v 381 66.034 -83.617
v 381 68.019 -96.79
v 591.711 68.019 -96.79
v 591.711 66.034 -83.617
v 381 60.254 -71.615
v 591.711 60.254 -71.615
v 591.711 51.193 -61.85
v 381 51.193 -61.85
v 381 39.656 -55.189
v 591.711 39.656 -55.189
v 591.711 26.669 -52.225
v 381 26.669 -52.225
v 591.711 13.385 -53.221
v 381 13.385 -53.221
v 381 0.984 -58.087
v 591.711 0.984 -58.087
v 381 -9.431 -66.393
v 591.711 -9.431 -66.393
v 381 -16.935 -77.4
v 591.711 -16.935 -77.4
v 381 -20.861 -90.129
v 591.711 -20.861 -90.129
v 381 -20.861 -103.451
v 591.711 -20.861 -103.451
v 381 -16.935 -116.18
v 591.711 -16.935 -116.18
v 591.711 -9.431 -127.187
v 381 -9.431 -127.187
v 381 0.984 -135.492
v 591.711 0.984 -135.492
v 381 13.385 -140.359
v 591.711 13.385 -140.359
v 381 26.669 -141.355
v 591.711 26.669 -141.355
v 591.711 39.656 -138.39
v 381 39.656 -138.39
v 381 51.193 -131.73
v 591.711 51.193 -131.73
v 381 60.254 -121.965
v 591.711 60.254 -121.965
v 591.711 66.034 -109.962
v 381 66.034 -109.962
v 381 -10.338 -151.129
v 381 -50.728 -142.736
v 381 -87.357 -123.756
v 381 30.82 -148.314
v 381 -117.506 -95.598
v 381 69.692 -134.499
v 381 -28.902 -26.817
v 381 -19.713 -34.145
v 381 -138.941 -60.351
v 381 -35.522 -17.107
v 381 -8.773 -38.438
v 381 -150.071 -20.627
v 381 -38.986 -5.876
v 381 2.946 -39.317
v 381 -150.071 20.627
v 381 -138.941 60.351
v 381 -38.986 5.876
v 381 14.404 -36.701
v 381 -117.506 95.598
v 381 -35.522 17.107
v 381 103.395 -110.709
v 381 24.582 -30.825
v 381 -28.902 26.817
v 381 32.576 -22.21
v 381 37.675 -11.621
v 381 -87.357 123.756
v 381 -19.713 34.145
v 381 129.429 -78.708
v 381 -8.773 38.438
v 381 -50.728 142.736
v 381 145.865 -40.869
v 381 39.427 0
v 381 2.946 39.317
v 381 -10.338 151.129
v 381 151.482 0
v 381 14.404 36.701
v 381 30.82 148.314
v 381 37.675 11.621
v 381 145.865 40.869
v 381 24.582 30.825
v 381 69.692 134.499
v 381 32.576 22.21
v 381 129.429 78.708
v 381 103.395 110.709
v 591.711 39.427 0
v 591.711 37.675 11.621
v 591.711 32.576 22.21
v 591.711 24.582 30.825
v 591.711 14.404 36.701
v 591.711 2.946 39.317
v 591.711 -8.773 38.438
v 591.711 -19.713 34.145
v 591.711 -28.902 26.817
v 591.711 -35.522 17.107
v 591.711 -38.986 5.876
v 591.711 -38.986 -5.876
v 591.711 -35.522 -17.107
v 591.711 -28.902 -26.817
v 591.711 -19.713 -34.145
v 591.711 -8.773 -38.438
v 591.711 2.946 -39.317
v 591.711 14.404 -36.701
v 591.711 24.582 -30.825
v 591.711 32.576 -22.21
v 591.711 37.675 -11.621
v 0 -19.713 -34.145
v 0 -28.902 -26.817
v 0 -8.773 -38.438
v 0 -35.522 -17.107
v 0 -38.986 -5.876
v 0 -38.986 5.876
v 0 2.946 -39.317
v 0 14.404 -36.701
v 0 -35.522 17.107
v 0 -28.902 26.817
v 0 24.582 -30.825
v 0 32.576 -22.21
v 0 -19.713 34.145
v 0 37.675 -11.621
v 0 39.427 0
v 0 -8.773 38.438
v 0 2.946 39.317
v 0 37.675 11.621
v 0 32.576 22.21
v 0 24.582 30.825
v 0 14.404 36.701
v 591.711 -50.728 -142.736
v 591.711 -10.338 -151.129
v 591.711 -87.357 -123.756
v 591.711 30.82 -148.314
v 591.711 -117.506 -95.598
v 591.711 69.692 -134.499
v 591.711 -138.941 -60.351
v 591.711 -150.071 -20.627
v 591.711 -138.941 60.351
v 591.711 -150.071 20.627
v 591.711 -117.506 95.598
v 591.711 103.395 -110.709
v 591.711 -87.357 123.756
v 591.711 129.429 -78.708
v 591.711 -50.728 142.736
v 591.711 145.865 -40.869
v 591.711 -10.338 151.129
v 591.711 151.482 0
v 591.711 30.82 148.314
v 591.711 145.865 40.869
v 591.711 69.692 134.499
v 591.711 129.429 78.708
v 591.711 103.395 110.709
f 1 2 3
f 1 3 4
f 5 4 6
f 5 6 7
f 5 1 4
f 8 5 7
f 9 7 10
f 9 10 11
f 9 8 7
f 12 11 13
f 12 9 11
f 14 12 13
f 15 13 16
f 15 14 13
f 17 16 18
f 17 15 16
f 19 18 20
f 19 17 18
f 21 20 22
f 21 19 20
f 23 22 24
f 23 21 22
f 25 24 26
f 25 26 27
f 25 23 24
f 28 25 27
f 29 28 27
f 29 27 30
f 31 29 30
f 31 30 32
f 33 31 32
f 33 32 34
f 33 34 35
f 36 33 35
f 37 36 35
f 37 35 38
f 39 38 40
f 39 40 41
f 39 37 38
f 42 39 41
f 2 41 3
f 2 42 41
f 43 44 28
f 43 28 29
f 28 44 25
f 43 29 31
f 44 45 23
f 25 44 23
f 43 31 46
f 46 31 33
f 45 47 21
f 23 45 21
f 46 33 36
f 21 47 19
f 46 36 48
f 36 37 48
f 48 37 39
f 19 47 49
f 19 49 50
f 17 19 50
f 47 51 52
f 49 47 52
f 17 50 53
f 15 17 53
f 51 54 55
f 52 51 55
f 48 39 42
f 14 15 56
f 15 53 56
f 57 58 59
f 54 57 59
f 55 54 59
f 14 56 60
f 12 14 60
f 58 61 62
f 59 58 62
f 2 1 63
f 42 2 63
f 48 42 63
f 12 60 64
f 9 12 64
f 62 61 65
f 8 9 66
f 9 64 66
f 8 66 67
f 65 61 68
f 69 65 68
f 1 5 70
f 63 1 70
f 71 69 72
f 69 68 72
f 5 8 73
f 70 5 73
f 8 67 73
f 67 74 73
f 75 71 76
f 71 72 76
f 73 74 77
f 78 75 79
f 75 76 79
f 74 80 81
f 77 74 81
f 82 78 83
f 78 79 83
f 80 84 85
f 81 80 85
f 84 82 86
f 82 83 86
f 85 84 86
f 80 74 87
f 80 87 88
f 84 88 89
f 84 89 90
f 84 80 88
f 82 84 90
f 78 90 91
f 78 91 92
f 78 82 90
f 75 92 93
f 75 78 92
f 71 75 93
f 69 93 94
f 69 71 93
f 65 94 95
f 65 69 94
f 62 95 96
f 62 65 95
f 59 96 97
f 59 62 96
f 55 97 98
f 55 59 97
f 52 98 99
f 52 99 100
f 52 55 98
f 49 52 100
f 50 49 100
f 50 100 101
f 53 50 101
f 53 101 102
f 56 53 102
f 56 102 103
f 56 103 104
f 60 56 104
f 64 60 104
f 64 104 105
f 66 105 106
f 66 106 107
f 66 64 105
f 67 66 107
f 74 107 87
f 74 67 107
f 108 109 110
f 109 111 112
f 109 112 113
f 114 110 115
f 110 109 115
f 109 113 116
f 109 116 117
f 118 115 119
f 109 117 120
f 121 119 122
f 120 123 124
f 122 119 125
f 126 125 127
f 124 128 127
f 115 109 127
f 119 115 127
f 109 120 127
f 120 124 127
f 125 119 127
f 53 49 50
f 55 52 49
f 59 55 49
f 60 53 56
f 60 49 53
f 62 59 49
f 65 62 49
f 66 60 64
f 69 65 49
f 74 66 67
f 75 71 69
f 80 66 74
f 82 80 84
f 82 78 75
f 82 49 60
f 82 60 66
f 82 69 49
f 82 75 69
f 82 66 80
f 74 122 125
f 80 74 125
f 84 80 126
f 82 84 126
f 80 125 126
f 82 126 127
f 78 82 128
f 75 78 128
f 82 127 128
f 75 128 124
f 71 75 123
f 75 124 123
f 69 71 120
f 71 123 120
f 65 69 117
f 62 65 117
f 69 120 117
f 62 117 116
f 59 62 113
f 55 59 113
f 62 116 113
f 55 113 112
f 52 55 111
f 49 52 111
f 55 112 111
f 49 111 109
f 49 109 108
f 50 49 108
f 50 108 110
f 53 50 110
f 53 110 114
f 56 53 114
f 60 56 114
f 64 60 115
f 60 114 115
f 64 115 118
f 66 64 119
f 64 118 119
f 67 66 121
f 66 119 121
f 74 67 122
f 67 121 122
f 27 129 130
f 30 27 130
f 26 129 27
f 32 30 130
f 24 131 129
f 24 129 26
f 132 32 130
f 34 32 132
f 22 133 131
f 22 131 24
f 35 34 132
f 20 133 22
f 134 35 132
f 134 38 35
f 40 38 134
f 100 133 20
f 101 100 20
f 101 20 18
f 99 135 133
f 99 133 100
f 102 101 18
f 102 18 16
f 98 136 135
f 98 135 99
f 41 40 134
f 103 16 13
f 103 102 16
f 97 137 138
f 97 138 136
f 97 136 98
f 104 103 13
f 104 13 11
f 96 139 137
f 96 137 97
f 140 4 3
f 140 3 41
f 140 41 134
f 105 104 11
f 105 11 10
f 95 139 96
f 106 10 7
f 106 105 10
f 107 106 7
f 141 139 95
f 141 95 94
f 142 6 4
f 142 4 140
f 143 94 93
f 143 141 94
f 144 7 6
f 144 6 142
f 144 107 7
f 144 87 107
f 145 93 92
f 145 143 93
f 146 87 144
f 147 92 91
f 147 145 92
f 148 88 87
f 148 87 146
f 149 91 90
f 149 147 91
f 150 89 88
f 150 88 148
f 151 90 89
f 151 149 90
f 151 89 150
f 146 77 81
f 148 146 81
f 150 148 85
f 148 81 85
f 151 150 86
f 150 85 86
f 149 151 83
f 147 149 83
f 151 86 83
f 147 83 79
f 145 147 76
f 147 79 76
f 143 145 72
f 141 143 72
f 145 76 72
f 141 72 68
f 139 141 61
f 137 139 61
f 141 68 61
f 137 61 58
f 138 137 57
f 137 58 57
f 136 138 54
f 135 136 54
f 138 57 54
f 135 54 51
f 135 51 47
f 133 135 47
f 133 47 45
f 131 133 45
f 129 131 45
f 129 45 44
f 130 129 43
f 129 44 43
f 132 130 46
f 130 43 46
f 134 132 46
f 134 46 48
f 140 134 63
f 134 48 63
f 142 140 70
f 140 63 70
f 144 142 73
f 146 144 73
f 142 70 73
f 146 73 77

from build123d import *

# Parameters (mm, degrees)
F0_R     = 39.426772
F1_DEPTH = 381
F2_R     = 151.482049
F2_R_2   = 44.689812
F2_R_3   = 39.426772
F3_DEPTH = 210.710973


with BuildPart() as f1:
    # F0 (on Right) → F1 (new body)
    with BuildSketch(Plane.YZ):
        Circle(F0_R)
    extrude(amount=F1_DEPTH)


with BuildPart() as f3:
    # F2 (on face) → F3 (new body)
    with BuildSketch(Plane.YZ.offset(381)):
        Circle(F2_R)
        with Locations((23.329172, -96.789889)):
            Circle(F2_R_2, mode=Mode.SUBTRACT)
        Circle(F2_R_3, mode=Mode.SUBTRACT)
    extrude(amount=F3_DEPTH)


solid = Compound([f1.part, f3.part])
